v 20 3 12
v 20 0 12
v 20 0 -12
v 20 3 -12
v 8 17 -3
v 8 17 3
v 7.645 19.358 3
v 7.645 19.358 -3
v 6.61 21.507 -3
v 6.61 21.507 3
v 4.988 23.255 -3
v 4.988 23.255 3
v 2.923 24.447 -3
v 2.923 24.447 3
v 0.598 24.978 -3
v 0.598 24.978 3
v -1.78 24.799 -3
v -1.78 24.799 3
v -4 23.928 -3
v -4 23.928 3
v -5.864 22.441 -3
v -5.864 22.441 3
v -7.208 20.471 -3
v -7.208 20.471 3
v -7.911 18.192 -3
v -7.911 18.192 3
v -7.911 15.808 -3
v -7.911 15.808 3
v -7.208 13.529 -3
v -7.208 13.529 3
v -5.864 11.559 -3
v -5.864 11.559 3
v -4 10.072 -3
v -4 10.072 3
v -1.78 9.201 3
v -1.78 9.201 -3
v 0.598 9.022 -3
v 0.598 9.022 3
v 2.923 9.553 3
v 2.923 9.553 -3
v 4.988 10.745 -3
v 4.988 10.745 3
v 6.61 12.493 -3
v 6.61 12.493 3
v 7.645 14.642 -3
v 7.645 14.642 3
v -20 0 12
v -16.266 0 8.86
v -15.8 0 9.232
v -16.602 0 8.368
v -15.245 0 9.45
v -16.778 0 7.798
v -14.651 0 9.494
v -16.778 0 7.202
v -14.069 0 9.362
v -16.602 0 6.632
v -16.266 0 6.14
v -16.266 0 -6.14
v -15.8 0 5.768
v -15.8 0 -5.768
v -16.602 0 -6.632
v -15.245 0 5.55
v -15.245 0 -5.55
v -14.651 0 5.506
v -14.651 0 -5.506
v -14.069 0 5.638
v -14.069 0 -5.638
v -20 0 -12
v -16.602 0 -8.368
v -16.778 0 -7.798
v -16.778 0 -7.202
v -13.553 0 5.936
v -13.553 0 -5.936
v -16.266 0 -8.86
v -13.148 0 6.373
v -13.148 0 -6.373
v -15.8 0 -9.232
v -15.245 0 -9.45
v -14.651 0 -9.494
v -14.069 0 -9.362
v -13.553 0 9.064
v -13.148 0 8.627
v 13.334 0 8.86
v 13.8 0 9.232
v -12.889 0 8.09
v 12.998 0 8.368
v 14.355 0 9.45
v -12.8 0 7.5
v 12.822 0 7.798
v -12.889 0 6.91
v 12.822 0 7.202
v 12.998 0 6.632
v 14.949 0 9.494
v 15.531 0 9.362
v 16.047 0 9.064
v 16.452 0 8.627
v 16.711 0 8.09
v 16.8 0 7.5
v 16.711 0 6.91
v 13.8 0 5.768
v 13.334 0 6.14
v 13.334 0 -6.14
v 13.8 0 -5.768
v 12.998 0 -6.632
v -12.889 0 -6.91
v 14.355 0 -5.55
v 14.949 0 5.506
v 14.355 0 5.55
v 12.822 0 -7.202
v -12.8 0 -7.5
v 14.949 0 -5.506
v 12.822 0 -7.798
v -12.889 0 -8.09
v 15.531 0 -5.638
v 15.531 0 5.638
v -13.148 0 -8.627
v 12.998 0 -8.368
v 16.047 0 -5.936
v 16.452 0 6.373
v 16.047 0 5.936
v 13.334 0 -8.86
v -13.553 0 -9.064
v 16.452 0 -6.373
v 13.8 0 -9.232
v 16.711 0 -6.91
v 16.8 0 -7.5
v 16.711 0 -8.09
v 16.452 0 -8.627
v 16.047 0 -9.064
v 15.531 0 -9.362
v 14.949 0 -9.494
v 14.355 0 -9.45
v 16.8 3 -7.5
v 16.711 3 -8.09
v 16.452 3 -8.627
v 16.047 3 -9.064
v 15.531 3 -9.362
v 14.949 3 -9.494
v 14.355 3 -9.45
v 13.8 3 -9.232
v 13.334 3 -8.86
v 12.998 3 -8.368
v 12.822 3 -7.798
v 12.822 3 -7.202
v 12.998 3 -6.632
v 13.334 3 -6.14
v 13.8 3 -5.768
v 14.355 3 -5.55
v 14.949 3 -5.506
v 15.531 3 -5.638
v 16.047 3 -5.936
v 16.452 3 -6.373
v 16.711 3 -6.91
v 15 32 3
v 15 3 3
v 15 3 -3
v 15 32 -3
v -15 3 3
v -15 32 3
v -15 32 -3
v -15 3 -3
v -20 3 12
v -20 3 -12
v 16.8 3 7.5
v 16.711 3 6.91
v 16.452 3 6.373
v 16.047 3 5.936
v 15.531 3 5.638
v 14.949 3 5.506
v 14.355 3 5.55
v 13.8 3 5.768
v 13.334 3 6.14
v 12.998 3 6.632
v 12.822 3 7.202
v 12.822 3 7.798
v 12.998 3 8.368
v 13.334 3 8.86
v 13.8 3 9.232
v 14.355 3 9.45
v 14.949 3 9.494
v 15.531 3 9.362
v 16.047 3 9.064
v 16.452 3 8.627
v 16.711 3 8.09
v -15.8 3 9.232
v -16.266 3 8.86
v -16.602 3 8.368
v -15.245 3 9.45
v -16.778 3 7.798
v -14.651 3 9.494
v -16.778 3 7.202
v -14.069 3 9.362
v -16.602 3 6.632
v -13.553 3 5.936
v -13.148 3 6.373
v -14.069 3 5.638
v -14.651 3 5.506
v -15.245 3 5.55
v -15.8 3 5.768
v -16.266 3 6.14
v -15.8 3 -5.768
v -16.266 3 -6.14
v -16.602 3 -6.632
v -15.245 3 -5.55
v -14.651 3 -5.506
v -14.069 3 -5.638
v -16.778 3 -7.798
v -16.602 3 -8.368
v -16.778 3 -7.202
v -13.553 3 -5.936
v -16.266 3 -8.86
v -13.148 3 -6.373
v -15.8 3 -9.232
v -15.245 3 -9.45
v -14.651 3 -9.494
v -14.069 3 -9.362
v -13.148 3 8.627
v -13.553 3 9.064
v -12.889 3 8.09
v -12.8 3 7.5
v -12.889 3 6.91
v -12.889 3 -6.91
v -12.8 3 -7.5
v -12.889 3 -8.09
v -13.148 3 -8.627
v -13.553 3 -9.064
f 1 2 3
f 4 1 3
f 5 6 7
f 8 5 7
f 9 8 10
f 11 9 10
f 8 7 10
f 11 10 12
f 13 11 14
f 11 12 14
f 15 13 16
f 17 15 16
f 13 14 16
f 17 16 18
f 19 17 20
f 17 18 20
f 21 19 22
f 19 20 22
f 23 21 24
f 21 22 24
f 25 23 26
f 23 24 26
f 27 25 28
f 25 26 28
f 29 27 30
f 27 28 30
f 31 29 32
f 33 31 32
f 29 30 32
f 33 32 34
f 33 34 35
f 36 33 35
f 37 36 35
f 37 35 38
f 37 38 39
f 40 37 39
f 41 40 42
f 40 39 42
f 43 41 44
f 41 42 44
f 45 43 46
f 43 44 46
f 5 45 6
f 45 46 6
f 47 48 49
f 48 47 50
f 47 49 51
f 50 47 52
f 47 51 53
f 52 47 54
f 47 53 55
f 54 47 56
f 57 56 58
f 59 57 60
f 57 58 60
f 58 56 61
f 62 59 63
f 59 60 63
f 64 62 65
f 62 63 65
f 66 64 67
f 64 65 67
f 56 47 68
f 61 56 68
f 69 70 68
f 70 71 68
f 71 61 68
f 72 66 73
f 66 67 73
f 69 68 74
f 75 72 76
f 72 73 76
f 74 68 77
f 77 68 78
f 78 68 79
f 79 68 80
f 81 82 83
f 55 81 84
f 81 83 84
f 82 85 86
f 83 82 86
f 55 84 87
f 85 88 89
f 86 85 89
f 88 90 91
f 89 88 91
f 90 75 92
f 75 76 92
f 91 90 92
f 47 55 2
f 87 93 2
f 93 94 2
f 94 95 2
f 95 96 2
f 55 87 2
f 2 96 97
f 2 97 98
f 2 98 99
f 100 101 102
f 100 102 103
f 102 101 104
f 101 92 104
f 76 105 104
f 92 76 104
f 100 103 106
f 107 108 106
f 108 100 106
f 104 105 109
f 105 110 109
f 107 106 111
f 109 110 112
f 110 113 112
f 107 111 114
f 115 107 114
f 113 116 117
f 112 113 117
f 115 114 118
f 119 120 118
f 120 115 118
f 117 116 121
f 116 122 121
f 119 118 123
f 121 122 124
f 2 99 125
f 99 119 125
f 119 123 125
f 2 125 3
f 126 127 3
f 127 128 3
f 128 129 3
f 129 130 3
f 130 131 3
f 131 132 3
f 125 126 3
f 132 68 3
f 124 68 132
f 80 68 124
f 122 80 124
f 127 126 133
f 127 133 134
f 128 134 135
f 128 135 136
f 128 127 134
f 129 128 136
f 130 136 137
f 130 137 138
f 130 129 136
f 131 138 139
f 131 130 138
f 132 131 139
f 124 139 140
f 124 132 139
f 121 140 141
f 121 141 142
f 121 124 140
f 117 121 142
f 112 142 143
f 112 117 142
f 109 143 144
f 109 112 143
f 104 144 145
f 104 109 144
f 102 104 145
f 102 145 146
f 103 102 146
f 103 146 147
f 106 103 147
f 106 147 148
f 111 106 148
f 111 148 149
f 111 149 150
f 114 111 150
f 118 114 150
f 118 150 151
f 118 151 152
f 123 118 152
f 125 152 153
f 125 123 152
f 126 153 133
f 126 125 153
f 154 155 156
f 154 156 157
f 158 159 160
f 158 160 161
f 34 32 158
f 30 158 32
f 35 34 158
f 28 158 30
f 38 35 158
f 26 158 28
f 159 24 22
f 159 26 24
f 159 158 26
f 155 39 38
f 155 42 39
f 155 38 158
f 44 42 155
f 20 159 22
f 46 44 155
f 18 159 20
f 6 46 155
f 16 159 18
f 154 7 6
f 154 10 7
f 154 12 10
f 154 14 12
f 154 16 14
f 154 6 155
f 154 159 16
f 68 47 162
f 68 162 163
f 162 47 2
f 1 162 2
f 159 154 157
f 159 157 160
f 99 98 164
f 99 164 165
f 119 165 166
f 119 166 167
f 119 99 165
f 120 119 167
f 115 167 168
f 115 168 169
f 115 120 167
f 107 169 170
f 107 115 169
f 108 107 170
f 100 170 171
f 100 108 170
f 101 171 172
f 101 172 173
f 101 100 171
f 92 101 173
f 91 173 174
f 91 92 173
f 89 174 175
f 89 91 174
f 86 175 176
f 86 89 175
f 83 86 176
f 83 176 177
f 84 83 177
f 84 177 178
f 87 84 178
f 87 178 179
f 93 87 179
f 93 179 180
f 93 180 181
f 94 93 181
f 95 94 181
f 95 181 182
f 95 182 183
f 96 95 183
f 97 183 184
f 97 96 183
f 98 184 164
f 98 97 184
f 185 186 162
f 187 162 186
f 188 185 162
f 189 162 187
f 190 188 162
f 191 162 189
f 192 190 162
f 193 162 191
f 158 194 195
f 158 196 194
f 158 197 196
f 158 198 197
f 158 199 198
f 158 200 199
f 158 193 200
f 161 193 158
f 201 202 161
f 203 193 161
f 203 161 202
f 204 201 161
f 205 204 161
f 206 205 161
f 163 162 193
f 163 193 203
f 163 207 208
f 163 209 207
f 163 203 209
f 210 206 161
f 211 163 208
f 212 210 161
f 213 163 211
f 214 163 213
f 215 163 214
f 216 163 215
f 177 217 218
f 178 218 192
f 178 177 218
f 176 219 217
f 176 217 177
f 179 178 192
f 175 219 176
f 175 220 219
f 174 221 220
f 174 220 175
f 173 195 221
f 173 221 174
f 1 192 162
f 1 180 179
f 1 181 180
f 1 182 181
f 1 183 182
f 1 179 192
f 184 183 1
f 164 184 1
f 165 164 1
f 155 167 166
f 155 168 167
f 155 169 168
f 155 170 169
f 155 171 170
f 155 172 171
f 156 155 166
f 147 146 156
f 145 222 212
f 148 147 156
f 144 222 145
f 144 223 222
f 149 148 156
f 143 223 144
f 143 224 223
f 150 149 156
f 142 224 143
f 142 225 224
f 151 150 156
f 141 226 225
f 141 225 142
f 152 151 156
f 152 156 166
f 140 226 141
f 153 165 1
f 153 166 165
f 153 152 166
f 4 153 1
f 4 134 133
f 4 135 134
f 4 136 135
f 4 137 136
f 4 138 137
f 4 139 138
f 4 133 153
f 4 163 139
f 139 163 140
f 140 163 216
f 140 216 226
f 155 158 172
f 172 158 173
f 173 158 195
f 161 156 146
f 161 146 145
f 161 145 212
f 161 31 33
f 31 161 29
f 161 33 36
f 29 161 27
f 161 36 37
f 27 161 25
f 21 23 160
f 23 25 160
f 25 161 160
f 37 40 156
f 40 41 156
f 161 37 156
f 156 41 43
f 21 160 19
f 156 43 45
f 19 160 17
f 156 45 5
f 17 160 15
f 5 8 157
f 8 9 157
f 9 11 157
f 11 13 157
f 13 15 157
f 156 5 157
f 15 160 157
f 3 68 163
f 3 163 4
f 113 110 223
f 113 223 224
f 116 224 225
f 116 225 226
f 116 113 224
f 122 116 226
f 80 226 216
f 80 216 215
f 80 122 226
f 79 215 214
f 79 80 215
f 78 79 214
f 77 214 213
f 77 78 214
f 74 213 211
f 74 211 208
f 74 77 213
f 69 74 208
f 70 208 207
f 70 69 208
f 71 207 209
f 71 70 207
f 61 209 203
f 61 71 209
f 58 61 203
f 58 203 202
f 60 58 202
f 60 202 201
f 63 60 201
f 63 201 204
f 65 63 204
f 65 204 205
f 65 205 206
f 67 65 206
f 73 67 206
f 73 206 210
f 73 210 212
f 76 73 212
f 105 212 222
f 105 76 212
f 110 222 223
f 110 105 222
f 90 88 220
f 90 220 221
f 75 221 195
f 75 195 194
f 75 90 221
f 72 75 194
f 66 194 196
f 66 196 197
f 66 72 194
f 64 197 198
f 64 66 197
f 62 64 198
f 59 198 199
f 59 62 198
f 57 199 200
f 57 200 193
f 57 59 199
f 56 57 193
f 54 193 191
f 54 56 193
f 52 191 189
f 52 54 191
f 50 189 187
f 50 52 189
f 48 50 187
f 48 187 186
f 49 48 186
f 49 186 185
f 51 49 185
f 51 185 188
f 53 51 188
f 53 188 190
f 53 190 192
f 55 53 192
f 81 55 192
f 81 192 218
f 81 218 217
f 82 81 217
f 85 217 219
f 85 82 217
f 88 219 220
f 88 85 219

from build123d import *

# Parameters (mm, degrees)
SKETCH_1_W          = 40
SKETCH_1_H          = 24
SKETCH_1_R          = 2
EXTRUDE_1_DEPTH     = 3
SKETCH_2_W          = 20
SKETCH_2_H          = 6
EXTRUDE_2_DEPTH     = 25
SKETCH_3_R          = 7.9375
CUT_EXTRUDE_1_DEPTH = 10
EXTRUDE_4_DEPTH     = 6
SKETCH_5_R          = 8
CUT_EXTRUDE_2_DEPTH = 6


with BuildPart() as part:
    # 草图1 → 凸台-拉伸1 (new body)
    with BuildSketch(Plane(origin=(0, 0, 0), x_dir=(1, 0, 0), z_dir=(0, 1, 0))):
        Rectangle(SKETCH_1_W, SKETCH_1_H)
        with Locations((-14.8, -7.5)):
            Circle(SKETCH_1_R, mode=Mode.SUBTRACT)
        with Locations((14.8, -7.5)):
            Circle(SKETCH_1_R, mode=Mode.SUBTRACT)
        with Locations((-14.8, 7.5)):
            Circle(SKETCH_1_R, mode=Mode.SUBTRACT)
        with Locations((14.8, 7.5)):
            Circle(SKETCH_1_R, mode=Mode.SUBTRACT)
    extrude(amount=EXTRUDE_1_DEPTH)

    # 草图2 → 凸台-拉伸2 (add)
    with BuildSketch(Plane(origin=(0, 3, 0), x_dir=(1, 0, 0), z_dir=(0, 1, 0))):
        Rectangle(SKETCH_2_W, SKETCH_2_H)
    extrude(amount=EXTRUDE_2_DEPTH)

    # 草图3 → 切除-拉伸1 (cut)
    with BuildSketch(Plane.XY.offset(3)):
        with Locations((0, 17)):
            Circle(SKETCH_3_R)
    extrude(amount=-CUT_EXTRUDE_1_DEPTH, mode=Mode.SUBTRACT)

    # 草图4 → 凸台-拉伸4 (add)
    with BuildSketch(Plane.XY.offset(3)):
        Polygon((-15, 32), (-15, 3), (-10, 3), (-10, 28), (10, 28), (10, 3), (15, 3), (15, 32), align=None)
    extrude(amount=-EXTRUDE_4_DEPTH)

    # 草图5 → 切除-拉伸2 (cut)
    with BuildSketch(Plane.XY.offset(3)):
        with Locations((0, 17)):
            Circle(SKETCH_5_R)
    extrude(amount=-CUT_EXTRUDE_2_DEPTH, mode=Mode.SUBTRACT)


solid = part.part
